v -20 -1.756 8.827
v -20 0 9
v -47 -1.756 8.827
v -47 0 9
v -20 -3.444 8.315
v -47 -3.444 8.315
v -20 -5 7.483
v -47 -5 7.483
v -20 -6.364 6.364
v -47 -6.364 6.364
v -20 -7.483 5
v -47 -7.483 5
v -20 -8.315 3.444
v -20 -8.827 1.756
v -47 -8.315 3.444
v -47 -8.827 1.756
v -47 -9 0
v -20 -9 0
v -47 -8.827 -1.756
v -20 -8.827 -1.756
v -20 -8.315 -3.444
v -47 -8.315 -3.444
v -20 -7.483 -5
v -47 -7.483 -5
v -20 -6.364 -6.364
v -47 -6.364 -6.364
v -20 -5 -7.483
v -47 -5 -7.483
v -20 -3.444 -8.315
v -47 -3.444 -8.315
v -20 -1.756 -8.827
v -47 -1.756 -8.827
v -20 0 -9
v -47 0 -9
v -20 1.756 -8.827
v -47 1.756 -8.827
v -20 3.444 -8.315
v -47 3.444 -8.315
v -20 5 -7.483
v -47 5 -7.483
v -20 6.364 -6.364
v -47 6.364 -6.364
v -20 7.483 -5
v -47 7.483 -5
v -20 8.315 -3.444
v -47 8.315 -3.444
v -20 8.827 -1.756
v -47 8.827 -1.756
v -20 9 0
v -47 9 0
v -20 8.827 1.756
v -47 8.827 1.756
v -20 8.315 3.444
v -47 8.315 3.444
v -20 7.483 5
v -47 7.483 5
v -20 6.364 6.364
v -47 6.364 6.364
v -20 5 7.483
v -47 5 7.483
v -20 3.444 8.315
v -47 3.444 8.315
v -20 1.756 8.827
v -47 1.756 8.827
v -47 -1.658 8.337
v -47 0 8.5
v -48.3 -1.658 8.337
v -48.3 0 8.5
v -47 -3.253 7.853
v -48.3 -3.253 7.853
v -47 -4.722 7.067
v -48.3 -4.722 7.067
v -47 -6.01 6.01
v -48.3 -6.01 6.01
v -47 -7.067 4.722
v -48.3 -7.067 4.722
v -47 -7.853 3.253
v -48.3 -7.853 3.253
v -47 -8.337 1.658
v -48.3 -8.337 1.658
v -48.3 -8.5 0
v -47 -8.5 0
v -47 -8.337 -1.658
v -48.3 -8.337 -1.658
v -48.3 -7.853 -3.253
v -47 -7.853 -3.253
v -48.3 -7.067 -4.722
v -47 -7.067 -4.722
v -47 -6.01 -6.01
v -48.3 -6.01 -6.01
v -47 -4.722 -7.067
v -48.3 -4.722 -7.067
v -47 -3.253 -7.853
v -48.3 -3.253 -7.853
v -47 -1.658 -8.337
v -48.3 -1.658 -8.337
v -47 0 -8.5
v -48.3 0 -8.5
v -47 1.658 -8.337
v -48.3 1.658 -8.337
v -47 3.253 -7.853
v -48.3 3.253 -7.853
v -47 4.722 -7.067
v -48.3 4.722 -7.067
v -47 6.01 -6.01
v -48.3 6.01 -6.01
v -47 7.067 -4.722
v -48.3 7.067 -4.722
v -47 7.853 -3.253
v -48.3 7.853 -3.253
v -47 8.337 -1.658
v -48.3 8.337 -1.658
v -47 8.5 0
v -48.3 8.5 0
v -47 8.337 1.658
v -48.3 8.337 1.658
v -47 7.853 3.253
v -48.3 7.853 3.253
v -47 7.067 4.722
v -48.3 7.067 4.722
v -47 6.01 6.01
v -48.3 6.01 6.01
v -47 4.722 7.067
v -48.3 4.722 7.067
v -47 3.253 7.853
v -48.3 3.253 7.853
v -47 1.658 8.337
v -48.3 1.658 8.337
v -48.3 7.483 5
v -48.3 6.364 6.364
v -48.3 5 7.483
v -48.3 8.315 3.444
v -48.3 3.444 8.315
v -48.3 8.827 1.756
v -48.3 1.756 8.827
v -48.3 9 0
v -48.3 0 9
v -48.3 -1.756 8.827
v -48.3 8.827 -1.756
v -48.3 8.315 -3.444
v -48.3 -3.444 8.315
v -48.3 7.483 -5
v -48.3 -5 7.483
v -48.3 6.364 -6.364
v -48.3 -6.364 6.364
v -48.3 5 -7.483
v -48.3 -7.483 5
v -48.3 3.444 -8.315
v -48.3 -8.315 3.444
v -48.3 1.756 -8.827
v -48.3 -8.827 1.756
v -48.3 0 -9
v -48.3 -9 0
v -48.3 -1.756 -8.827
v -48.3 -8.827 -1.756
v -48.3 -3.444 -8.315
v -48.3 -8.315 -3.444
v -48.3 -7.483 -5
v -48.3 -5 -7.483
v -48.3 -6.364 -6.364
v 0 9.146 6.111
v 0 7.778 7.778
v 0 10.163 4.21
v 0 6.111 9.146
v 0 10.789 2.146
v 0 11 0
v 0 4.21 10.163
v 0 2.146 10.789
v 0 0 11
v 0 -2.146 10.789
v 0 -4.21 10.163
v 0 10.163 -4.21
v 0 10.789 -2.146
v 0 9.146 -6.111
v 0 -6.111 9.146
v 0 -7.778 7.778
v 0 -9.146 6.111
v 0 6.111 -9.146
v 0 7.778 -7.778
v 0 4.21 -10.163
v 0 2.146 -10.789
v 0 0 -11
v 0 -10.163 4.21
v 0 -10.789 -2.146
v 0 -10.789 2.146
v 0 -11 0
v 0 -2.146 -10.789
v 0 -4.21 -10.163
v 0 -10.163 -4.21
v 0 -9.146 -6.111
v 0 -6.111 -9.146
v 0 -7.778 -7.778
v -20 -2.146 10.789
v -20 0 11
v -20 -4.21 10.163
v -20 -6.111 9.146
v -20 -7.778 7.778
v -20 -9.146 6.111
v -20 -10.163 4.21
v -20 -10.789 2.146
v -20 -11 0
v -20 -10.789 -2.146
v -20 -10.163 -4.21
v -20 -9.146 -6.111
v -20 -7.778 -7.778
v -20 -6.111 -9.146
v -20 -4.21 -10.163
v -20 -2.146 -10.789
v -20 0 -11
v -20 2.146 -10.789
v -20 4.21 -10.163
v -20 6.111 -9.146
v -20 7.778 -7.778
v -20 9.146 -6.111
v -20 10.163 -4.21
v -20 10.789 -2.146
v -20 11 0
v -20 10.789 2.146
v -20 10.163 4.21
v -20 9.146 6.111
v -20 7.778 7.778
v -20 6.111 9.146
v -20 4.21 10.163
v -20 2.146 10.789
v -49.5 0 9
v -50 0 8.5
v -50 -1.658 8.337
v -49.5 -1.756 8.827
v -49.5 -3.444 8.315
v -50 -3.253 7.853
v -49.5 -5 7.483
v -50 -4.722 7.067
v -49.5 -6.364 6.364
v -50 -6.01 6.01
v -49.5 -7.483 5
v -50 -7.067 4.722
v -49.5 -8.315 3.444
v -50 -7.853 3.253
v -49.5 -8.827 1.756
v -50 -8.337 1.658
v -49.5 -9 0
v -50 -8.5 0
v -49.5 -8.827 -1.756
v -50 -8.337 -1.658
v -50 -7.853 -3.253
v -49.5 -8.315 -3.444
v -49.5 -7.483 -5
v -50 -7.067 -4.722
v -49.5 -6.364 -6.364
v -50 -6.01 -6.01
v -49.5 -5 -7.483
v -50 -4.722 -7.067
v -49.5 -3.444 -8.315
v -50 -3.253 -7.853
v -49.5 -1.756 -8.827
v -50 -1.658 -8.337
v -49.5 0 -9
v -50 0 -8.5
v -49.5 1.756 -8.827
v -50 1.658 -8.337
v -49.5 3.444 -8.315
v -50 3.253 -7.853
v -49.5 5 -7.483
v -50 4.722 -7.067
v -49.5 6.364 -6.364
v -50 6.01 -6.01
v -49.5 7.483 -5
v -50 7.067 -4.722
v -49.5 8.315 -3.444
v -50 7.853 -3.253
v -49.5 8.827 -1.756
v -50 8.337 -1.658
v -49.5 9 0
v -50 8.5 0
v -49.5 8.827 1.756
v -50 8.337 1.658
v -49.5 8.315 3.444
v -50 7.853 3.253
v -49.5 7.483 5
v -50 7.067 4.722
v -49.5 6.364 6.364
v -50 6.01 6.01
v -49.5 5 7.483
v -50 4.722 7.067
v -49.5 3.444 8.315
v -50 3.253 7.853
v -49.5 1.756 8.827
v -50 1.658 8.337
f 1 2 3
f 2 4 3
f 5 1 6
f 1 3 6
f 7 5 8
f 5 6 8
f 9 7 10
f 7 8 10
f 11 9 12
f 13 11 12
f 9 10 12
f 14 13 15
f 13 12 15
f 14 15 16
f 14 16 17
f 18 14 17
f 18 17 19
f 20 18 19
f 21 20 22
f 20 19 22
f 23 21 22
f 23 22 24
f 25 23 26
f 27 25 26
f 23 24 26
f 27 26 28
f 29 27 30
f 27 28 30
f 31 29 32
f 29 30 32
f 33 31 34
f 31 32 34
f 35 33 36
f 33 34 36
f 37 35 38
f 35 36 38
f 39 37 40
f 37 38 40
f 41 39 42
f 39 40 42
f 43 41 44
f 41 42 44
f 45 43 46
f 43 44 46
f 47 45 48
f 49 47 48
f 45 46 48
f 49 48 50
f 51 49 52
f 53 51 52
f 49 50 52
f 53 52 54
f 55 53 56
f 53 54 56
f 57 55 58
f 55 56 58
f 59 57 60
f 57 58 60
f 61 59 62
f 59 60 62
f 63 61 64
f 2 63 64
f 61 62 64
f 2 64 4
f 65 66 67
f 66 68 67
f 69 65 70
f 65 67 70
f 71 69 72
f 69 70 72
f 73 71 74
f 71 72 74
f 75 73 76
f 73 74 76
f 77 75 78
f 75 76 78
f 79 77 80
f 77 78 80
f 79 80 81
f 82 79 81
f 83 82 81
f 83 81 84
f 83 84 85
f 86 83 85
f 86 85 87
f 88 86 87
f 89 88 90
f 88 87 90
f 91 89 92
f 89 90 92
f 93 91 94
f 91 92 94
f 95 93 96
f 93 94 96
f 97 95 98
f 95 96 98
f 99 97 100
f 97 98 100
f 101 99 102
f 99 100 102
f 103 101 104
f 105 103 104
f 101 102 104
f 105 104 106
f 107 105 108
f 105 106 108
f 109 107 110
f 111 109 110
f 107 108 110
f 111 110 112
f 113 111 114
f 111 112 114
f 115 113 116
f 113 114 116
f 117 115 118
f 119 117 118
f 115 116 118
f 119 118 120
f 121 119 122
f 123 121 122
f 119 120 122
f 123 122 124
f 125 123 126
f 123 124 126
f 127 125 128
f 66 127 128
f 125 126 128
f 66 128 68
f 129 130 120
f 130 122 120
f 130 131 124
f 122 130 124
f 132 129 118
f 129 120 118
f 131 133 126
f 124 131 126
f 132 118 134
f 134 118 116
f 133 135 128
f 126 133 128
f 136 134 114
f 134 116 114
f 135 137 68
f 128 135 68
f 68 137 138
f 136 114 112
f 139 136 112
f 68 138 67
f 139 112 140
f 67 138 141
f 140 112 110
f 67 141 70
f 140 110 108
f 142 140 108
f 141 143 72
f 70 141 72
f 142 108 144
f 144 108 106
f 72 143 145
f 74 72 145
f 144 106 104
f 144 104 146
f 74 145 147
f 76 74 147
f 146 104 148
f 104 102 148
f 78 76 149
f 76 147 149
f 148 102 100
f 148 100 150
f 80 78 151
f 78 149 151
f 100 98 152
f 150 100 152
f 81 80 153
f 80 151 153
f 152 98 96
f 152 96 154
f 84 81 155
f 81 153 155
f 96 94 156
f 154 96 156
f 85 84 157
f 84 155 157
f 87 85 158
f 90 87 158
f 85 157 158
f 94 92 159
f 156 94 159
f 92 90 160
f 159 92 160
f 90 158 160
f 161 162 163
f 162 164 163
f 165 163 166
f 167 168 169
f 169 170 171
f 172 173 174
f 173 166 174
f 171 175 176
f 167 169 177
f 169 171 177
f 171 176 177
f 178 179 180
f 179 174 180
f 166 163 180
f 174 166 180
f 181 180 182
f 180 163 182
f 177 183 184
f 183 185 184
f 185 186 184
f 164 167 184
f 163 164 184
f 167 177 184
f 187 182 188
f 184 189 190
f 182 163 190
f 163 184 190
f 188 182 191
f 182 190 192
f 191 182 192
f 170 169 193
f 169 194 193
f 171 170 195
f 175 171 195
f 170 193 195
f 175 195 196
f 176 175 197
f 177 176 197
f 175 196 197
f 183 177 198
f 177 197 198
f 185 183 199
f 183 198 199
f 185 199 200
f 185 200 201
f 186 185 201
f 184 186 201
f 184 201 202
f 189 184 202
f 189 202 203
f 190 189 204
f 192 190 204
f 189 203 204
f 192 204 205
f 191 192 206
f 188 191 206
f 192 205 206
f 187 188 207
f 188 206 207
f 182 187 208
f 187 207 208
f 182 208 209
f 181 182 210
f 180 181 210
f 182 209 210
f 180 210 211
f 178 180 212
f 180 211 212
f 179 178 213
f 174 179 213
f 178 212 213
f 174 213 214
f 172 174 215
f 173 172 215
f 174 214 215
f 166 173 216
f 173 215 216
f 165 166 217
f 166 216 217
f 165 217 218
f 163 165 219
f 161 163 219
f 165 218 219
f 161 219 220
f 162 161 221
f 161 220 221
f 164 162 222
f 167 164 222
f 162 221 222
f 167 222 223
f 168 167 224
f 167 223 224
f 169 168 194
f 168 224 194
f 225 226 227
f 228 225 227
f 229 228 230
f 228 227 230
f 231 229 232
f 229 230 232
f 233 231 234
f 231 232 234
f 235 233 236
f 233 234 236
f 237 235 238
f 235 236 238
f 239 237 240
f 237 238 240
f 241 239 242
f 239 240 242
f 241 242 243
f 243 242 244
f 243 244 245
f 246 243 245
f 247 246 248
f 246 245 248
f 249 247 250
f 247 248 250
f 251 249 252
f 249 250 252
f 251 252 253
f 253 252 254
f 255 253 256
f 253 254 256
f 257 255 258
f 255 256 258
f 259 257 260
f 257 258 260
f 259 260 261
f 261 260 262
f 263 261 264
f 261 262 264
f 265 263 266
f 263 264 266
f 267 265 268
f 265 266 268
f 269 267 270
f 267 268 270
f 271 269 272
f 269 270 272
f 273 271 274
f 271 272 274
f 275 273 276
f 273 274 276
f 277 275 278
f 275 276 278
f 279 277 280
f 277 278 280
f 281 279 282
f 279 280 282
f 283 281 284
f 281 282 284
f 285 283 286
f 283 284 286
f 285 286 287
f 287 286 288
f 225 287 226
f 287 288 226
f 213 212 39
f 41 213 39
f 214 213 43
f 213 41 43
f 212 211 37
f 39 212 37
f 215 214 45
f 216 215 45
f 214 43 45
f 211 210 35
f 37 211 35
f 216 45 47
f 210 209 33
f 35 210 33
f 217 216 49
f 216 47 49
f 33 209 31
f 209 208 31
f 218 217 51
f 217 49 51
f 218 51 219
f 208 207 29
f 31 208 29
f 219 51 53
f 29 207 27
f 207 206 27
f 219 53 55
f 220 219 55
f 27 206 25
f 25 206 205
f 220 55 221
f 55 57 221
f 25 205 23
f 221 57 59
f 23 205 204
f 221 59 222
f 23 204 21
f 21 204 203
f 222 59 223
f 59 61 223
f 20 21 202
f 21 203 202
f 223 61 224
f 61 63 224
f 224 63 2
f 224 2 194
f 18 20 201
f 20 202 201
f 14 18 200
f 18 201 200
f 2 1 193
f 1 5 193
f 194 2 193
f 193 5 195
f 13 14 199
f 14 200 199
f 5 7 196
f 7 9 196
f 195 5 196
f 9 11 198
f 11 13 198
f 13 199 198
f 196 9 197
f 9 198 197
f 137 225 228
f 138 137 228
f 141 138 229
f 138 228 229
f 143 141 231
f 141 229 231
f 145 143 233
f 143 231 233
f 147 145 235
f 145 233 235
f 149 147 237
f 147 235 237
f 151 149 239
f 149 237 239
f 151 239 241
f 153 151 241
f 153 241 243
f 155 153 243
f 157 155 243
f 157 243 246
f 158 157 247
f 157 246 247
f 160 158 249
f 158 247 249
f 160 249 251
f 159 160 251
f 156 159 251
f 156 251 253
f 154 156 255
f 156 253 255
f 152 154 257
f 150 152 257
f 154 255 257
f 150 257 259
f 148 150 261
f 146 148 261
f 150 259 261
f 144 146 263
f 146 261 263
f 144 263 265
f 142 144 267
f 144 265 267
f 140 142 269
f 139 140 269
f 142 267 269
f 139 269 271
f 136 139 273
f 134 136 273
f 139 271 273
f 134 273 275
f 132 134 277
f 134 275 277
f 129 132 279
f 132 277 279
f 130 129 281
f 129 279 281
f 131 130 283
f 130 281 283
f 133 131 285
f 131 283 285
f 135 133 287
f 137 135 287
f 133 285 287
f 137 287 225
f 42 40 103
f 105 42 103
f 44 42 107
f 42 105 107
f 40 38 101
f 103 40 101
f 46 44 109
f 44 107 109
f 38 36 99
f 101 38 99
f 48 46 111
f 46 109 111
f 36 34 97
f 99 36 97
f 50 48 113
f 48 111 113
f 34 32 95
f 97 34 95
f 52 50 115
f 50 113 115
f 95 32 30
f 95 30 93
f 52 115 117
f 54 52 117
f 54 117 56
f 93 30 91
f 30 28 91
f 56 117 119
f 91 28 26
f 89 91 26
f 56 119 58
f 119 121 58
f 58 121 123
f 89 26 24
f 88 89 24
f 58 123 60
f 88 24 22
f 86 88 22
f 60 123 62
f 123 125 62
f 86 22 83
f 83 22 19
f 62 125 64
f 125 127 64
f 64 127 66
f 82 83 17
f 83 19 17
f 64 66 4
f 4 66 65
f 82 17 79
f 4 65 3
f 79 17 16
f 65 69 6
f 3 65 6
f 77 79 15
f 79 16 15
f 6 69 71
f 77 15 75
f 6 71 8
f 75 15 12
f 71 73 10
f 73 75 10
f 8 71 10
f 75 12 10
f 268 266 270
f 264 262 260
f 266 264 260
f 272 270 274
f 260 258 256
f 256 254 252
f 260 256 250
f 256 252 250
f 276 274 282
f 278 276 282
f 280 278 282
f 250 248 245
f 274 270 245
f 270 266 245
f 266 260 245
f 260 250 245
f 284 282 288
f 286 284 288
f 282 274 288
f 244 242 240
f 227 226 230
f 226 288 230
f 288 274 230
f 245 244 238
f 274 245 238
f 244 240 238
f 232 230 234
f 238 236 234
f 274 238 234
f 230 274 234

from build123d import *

# Parameters (mm, degrees)
CHANFRO1_SIZE = 0.5


with BuildPart() as part:
    # Esboço1 → Revolução1 (revolve)
    with BuildSketch(Plane(origin=(0, 0, 0), x_dir=(1, 0, 0), z_dir=(0, 1, 0)), mode=Mode.PRIVATE) as revolu_o1_sk:
        Polygon((0, 0), (0, 11), (-20, 11), (-20, 9), (-47, 9), (-47, 8.5), (-48.3, 8.5), (-48.3, 9), (-50, 9), (-50, 0), align=None)
    revolve(revolu_o1_sk.sketch.rotate(Axis((-50, 0, 0), (1, 0, 0)), 180), axis=Axis((-50, 0, 0), (1, 0, 0)))

    # Chanfro1
    chanfro1_edges = [part.edges().sort_by_distance(p)[0] for p in [
        (-50, 0, -9),
    ]]
    chamfer(chanfro1_edges, length=CHANFRO1_SIZE)


solid = part.part
